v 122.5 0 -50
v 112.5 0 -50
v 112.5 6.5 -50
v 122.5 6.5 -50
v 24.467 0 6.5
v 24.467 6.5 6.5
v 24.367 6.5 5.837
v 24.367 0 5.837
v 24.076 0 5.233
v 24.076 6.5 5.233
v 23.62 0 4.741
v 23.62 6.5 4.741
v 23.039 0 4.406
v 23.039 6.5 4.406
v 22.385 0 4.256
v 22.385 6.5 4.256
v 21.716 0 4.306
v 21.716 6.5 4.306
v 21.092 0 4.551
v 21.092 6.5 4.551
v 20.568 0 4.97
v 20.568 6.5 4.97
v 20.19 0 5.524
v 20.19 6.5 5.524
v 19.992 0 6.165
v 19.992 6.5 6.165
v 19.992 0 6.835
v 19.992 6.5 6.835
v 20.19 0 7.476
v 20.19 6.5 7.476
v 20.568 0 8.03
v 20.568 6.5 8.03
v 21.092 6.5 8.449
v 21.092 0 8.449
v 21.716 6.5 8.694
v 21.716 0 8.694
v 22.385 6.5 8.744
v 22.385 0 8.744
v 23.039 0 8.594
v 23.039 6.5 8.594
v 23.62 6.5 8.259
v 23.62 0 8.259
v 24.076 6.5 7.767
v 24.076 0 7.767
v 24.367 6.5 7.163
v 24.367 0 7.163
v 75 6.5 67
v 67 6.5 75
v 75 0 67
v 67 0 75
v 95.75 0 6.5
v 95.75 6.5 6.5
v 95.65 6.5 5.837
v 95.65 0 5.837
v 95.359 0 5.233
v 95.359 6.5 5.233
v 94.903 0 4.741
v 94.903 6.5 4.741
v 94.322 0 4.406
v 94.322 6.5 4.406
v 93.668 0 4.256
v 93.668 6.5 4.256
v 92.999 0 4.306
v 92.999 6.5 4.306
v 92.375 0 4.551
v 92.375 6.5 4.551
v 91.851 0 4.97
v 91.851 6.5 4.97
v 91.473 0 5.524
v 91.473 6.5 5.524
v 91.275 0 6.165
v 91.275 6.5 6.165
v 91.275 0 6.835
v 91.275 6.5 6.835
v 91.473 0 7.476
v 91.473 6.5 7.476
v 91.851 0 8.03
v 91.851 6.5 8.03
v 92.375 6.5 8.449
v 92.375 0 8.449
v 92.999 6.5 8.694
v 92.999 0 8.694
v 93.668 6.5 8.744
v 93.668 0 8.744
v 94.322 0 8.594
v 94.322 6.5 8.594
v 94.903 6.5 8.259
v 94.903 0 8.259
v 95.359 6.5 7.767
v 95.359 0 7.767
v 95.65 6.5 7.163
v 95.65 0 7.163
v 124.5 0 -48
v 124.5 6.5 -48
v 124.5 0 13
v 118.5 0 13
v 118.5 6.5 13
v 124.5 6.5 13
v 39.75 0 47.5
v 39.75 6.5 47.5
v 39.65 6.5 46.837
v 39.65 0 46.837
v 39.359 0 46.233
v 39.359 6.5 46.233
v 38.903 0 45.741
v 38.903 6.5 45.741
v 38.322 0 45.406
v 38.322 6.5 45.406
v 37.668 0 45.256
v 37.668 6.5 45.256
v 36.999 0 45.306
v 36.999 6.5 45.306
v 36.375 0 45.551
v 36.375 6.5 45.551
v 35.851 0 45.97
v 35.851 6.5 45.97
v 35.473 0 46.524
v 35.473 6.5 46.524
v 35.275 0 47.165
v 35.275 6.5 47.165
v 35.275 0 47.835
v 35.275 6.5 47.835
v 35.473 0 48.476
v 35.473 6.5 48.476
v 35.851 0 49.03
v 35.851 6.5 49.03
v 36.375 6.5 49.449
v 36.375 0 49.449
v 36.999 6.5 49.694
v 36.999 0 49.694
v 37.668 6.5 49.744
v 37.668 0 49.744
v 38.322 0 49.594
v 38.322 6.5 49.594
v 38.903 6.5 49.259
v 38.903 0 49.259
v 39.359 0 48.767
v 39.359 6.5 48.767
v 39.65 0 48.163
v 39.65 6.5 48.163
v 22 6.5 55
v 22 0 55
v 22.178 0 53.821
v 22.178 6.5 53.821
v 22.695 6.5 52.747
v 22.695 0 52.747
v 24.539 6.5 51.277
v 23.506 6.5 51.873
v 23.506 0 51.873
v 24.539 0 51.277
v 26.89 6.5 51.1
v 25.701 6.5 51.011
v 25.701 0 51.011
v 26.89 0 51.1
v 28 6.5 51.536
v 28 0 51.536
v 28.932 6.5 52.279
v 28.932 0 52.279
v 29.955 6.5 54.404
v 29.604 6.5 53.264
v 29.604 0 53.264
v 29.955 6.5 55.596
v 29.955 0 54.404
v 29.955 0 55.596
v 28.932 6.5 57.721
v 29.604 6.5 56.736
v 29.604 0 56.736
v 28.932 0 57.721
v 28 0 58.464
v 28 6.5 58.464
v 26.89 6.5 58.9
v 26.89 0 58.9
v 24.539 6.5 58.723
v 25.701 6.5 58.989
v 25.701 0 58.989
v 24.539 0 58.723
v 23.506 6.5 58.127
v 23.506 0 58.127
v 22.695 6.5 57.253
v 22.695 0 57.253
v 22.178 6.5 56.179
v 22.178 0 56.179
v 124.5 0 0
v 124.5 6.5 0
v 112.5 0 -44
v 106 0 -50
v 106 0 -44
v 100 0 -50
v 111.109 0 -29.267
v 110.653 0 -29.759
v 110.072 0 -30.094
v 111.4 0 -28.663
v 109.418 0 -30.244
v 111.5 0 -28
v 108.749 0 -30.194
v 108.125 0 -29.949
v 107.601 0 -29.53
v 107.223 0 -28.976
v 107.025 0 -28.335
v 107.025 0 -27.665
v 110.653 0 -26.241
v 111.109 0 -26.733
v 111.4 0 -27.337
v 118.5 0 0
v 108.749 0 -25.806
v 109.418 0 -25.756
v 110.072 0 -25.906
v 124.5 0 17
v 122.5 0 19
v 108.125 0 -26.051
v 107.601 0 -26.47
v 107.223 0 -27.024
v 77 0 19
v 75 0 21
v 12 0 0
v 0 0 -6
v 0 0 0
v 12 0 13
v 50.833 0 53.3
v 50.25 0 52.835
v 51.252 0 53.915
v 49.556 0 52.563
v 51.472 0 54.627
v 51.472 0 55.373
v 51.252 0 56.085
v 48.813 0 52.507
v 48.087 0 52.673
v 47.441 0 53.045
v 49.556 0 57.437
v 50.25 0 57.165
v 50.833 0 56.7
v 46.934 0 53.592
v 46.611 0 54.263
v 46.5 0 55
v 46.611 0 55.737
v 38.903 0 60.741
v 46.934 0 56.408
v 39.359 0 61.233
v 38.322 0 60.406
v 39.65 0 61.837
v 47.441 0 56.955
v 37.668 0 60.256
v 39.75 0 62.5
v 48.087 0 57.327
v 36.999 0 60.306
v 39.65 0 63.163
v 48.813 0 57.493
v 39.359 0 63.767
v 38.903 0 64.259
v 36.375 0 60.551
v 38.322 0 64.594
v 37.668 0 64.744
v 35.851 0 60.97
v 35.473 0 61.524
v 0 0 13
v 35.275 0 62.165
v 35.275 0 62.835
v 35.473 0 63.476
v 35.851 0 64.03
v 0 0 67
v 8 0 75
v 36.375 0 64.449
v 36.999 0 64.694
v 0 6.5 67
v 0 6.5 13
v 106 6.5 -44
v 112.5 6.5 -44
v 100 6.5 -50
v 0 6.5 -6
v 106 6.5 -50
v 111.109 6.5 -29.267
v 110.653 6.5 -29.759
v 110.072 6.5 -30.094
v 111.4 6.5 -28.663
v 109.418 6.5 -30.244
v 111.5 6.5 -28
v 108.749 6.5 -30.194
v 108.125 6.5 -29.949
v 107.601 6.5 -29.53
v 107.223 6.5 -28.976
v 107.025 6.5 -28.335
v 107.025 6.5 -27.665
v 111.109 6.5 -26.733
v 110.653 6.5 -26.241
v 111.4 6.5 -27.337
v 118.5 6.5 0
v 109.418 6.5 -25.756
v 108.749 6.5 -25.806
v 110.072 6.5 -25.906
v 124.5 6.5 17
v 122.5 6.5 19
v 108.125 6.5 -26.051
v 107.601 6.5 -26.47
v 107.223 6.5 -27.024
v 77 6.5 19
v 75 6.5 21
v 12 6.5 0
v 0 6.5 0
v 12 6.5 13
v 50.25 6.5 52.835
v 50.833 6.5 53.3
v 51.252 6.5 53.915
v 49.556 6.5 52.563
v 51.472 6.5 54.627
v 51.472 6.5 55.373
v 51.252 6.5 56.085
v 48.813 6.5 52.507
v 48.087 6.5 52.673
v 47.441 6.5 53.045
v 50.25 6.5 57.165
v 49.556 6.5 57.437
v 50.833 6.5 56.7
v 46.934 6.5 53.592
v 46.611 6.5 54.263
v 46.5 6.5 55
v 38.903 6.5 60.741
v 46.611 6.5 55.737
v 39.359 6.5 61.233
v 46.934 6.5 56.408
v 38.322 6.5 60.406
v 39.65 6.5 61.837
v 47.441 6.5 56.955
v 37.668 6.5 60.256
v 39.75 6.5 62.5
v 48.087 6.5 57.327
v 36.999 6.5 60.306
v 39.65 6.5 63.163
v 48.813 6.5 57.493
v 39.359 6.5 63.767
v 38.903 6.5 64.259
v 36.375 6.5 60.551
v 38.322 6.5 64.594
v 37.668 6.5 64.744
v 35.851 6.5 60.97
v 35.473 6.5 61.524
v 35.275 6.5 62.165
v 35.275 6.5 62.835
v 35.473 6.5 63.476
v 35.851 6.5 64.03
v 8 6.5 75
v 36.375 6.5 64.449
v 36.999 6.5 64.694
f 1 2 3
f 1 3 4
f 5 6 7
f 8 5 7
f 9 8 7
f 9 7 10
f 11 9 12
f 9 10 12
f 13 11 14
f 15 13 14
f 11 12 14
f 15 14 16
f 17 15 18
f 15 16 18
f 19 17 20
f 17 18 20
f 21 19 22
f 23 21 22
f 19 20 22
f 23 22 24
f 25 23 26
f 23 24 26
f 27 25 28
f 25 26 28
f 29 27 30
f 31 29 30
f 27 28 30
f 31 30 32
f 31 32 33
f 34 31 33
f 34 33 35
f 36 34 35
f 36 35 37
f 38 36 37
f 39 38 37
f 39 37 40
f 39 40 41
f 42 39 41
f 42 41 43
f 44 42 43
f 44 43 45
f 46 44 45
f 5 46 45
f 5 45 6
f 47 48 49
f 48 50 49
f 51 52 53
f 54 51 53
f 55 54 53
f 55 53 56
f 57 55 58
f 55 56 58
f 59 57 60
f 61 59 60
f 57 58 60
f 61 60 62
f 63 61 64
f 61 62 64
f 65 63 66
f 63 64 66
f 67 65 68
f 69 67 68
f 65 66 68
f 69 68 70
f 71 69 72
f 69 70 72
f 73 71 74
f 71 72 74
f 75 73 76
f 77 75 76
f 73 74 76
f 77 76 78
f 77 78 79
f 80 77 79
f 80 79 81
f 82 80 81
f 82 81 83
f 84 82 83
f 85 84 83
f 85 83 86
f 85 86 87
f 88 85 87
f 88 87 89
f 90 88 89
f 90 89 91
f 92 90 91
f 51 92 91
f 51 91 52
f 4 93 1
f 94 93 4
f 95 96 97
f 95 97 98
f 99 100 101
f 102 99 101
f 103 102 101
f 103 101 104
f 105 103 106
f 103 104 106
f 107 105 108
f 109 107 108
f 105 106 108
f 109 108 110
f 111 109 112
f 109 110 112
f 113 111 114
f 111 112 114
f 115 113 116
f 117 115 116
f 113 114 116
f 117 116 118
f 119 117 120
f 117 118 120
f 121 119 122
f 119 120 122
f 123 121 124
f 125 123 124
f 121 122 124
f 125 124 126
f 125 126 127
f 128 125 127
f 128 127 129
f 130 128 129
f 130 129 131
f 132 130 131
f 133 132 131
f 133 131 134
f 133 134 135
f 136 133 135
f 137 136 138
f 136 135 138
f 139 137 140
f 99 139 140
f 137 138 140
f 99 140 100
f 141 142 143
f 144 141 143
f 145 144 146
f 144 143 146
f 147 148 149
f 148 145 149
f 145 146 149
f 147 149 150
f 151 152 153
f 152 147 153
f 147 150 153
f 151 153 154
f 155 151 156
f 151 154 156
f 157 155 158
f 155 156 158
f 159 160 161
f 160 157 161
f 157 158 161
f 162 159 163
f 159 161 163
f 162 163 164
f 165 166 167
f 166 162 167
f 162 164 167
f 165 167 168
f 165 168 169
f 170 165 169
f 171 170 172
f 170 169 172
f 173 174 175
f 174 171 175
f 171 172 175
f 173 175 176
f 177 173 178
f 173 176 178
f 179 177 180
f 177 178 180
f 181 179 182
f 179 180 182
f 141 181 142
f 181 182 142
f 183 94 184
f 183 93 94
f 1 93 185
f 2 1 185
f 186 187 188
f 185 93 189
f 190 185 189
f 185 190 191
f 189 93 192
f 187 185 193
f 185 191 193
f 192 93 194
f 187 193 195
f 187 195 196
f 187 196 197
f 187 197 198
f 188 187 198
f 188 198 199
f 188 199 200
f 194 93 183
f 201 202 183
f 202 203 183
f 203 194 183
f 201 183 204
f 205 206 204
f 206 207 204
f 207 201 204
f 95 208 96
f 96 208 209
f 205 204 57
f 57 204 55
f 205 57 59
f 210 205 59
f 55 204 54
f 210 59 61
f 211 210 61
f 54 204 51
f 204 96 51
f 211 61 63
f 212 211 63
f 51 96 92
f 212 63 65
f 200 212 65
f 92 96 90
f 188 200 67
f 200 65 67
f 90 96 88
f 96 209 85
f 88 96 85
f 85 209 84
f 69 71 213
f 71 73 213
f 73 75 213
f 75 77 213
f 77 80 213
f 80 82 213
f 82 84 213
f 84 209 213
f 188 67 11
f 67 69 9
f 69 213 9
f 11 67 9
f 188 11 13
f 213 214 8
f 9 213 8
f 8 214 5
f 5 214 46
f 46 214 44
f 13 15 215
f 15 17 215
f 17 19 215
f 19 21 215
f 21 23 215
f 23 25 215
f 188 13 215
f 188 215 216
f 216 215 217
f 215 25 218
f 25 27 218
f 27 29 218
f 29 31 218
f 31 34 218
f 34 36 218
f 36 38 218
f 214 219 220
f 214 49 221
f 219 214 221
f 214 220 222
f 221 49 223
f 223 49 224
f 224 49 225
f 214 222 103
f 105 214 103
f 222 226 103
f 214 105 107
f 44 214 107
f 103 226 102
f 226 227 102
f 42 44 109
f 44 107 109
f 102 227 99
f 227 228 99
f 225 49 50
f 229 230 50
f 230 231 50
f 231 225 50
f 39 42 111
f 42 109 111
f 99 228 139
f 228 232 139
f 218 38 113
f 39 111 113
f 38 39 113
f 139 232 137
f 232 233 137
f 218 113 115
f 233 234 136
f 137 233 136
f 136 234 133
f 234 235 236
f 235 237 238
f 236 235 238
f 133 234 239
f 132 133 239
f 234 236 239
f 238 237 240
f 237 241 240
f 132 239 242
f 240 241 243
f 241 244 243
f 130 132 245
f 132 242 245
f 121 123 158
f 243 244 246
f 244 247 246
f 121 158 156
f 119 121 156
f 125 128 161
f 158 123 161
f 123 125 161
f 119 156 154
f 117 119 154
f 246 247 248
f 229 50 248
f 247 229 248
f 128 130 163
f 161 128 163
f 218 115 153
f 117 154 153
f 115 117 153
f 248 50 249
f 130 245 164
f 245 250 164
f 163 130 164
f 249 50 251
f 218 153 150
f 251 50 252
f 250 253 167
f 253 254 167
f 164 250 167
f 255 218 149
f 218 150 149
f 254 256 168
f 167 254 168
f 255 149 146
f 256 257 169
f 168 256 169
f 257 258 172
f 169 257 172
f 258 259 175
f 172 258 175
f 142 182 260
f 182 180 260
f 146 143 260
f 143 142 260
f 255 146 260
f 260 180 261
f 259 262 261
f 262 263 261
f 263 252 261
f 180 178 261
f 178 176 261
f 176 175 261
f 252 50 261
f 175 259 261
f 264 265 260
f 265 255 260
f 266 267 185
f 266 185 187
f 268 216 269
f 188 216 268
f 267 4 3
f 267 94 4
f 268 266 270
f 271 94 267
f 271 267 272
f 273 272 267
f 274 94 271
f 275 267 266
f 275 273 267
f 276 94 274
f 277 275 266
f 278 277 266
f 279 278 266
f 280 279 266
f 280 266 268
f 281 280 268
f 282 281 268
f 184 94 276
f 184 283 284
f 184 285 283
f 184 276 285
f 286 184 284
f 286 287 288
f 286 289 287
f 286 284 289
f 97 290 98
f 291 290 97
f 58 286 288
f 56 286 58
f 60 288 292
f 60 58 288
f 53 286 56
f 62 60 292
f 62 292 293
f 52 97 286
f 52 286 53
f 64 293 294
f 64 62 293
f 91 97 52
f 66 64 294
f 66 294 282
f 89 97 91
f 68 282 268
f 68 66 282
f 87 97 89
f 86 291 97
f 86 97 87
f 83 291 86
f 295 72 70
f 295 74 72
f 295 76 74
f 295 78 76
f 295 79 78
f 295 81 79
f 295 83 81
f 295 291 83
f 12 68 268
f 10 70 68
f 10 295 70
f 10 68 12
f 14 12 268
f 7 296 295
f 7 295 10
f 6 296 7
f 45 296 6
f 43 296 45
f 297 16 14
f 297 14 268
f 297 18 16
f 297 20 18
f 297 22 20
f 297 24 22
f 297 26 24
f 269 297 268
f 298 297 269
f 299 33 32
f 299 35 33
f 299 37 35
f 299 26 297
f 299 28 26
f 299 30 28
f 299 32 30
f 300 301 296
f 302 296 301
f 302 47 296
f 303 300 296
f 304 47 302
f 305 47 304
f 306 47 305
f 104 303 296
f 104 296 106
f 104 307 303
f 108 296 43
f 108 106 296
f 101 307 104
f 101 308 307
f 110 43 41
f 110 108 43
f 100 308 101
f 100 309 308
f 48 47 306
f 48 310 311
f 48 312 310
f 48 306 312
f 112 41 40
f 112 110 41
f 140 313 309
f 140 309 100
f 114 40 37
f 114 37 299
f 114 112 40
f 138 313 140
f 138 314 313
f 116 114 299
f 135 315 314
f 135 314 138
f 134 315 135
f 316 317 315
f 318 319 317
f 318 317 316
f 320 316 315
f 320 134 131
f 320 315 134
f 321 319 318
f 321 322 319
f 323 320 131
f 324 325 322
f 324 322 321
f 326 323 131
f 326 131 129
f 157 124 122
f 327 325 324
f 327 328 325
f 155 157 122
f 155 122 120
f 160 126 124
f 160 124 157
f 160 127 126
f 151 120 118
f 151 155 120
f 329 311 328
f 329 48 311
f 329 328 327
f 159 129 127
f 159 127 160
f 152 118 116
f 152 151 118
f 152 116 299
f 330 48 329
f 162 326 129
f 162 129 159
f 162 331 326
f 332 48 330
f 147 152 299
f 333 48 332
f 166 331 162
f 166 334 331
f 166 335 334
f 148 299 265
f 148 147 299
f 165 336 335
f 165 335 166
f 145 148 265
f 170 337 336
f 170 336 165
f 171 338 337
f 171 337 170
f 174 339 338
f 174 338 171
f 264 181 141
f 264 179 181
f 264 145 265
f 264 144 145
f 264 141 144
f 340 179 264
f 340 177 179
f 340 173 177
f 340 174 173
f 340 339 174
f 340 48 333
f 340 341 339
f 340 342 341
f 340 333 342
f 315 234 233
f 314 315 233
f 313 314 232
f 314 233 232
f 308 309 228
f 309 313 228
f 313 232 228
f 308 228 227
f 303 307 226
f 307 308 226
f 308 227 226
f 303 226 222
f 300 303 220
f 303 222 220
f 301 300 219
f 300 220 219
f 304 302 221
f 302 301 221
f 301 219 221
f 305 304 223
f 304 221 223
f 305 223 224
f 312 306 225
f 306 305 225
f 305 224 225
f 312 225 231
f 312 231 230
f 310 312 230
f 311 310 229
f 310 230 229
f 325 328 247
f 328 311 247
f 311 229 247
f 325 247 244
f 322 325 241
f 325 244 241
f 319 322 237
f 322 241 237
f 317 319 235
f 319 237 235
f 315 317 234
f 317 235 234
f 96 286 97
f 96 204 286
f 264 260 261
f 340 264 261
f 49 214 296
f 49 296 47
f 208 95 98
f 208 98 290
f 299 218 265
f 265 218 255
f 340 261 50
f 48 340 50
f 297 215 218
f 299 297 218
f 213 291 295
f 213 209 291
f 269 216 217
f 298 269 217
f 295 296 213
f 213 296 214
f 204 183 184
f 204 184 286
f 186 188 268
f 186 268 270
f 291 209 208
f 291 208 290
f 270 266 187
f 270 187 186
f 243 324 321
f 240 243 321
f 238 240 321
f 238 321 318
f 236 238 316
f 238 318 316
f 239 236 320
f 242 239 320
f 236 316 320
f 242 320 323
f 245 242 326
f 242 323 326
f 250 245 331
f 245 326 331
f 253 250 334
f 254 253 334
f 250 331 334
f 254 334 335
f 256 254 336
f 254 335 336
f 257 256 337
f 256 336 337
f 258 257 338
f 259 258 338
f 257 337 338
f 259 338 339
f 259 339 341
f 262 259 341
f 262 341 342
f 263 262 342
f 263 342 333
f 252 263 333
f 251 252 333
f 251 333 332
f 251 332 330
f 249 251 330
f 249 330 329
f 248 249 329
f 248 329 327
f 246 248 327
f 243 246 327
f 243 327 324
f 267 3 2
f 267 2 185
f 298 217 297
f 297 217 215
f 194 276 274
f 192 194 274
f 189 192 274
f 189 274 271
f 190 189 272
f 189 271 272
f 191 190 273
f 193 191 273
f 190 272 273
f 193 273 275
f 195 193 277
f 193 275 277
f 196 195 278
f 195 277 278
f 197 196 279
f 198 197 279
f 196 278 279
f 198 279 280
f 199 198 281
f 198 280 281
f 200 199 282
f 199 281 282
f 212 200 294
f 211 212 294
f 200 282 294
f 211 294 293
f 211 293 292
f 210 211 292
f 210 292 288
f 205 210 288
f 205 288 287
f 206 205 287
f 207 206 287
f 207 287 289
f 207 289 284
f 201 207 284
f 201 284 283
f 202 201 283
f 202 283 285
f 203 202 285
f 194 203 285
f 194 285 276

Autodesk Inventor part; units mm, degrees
ref_plane "YZ Plane" through (0, 0, 0) normal (1, 0, 0) x (0, 1, 0)
ref_plane "XZ Plane" through (0, 0, 0) normal (0, 1, 0) x (-1, 0, 0)
ref_plane "XY Plane" through (0, 0, 0) normal (0, 0, 1) x (1, 0, 0)
sketch "Sketch1" plane through (0, 0, 0) normal (0, 1, 0) x (-1, 0, 0)
  line L0 (0, -6) -> (0, 0)
  line L1 (0, 0) -> (-12, 0)
  line L2 (-12, 0) -> (-12, 13)
  line L3 (-12, 13) -> (0, 13)
  line L4 (0, 13) -> (0, 67)
  line L5 (0, 67) -> (-8, 75)
  line L6 (-8, 75) -> (-67, 75)
  line L7 (-67, 75) -> (-75, 67)
  line L8 (0, -6) -> (-100, -50)
  line L9 (-100, -50) -> (-124.5, -50)
  line L10 (-124.5, -50) -> (-124.5, 0)
  line L11 (-124.5, 0) -> (-118.5, 0)
  line L12 (-118.5, 0) -> (-118.5, 13)
  line L13 (-118.5, 13) -> (-124.5, 13)
  line L14 (-124.5, 13) -> (-124.5, 19)
  line L15 (-124.5, 19) -> (-75, 19)
  line L16 (-75, 19) -> (-75, 67)
  circle A0 centre (-26, 55) radius 4
  circle A1 centre (-49, 55) radius 2.5
  line L17 (-106, -50) -> (-112.5, -50) construction
  line L18 (-112.5, -50) -> (-112.5, 13) construction
  line L19 (-112.5, 13) -> (-106, 13) construction
  line L20 (-106, 13) -> (-106, -50) construction
  dimension "d0" = 13
  dimension "d1" = 12
  dimension "d2" = 6
  dimension "d3" = 6
  dimension "d4" = 6
  dimension "d6" = 75
  dimension "d7" = 8
  dimension "d8" = 5
  dimension "d9" = 23
  dimension "d10" = 106.5
  dimension "d11" = 45
  dimension "d12" = 8
  dimension "d13" = 6.5
  dimension "d14" = 6
  dimension "d15" = 6
  dimension "d16" = 42
  dimension "d17" = 20
  dimension "d18" = 50
  dimension "d19" = 26
extrude "Extrusion1" add sketch "Sketch1" along normal blind 6.5
sketch "Sketch3" plane through (0, 6.5, 0) normal (0, 1, 0) x (1, 0, 0)
  line L0 (124.5, 0) -> (124.5, 50) projected
  line L1 (124.5, 50) -> (100, 50) projected
  line L2 (106, 50) -> (112.5, 50)
  line L3 (112.5, 50) -> (112.5, 44)
  line L4 (112.5, 44) -> (106, 44)
  line L5 (106, 44) -> (106, 50)
  dimension "d27" = 6
  dimension "d28" = 6.5
  dimension "d29" = 12
extrude "Extrusion3" cut sketch "Sketch3" against normal through all
chamfer "Chamfer1" distance 2 angle 45 3 edges at (75, 3.25, 19) (124.5, 3.25, 19) (124.5, 3.25, -50)
sketch "Sketch4" plane through (0, 6.5, 0) normal (0, 1, 0) x (1, 0, 0)
  line L0 (124.5, 0) -> (124.5, 48) projected
  circle A0 centre (26, -55) radius 4 projected
  circle A1 centre (49, -55) radius 2.5 projected
  circle A2 centre (37.5, -47.5) radius 2.25
  circle A3 centre (37.5, -62.5) radius 2.25
  line L1 (37.5, -47.5) -> (37.5, -62.5) construction
  line L2 (26, -55) -> (49, -55) construction
  point P0 (37.5, -55)
  dimension "d35" = 15
  dimension "d36" = 4.5
extrude "Extrusion4" cut sketch "Sketch4" against normal through all contours A2 | A3
sketch "Sketch5" plane through (0, 6.5, 0) normal (0, 1, 0) x (1, 0, 0)
  line L0 (112.5, 44) -> (106, 44) projected
  line L1 (12, 0) -> (12, -13) projected
  line L2 (0, -13) -> (0, -67) projected
  line L3 (118.5, -13) -> (118.5, 0) projected
  line L4 (118.5, 0) -> (124.5, 0) projected
  circle A0 centre (22.217, -6.5) radius 2.25
  circle A1 centre (93.5, -6.5) radius 2.25
  circle A2 centre (109.25, 28) radius 2.25
  point P0 (12, -6.5)
  point P1 (109.25, 44)
  dimension "d39" = 4.5
  dimension "d40" = 22.217
  dimension "d41" = 25
  dimension "d42" = 28
extrude "Extrusion5" cut sketch "Sketch5" against normal through all
equation "\"d2\" = d3"
equation "\"d4\" = d3"
properties part number "z_axis_top"
